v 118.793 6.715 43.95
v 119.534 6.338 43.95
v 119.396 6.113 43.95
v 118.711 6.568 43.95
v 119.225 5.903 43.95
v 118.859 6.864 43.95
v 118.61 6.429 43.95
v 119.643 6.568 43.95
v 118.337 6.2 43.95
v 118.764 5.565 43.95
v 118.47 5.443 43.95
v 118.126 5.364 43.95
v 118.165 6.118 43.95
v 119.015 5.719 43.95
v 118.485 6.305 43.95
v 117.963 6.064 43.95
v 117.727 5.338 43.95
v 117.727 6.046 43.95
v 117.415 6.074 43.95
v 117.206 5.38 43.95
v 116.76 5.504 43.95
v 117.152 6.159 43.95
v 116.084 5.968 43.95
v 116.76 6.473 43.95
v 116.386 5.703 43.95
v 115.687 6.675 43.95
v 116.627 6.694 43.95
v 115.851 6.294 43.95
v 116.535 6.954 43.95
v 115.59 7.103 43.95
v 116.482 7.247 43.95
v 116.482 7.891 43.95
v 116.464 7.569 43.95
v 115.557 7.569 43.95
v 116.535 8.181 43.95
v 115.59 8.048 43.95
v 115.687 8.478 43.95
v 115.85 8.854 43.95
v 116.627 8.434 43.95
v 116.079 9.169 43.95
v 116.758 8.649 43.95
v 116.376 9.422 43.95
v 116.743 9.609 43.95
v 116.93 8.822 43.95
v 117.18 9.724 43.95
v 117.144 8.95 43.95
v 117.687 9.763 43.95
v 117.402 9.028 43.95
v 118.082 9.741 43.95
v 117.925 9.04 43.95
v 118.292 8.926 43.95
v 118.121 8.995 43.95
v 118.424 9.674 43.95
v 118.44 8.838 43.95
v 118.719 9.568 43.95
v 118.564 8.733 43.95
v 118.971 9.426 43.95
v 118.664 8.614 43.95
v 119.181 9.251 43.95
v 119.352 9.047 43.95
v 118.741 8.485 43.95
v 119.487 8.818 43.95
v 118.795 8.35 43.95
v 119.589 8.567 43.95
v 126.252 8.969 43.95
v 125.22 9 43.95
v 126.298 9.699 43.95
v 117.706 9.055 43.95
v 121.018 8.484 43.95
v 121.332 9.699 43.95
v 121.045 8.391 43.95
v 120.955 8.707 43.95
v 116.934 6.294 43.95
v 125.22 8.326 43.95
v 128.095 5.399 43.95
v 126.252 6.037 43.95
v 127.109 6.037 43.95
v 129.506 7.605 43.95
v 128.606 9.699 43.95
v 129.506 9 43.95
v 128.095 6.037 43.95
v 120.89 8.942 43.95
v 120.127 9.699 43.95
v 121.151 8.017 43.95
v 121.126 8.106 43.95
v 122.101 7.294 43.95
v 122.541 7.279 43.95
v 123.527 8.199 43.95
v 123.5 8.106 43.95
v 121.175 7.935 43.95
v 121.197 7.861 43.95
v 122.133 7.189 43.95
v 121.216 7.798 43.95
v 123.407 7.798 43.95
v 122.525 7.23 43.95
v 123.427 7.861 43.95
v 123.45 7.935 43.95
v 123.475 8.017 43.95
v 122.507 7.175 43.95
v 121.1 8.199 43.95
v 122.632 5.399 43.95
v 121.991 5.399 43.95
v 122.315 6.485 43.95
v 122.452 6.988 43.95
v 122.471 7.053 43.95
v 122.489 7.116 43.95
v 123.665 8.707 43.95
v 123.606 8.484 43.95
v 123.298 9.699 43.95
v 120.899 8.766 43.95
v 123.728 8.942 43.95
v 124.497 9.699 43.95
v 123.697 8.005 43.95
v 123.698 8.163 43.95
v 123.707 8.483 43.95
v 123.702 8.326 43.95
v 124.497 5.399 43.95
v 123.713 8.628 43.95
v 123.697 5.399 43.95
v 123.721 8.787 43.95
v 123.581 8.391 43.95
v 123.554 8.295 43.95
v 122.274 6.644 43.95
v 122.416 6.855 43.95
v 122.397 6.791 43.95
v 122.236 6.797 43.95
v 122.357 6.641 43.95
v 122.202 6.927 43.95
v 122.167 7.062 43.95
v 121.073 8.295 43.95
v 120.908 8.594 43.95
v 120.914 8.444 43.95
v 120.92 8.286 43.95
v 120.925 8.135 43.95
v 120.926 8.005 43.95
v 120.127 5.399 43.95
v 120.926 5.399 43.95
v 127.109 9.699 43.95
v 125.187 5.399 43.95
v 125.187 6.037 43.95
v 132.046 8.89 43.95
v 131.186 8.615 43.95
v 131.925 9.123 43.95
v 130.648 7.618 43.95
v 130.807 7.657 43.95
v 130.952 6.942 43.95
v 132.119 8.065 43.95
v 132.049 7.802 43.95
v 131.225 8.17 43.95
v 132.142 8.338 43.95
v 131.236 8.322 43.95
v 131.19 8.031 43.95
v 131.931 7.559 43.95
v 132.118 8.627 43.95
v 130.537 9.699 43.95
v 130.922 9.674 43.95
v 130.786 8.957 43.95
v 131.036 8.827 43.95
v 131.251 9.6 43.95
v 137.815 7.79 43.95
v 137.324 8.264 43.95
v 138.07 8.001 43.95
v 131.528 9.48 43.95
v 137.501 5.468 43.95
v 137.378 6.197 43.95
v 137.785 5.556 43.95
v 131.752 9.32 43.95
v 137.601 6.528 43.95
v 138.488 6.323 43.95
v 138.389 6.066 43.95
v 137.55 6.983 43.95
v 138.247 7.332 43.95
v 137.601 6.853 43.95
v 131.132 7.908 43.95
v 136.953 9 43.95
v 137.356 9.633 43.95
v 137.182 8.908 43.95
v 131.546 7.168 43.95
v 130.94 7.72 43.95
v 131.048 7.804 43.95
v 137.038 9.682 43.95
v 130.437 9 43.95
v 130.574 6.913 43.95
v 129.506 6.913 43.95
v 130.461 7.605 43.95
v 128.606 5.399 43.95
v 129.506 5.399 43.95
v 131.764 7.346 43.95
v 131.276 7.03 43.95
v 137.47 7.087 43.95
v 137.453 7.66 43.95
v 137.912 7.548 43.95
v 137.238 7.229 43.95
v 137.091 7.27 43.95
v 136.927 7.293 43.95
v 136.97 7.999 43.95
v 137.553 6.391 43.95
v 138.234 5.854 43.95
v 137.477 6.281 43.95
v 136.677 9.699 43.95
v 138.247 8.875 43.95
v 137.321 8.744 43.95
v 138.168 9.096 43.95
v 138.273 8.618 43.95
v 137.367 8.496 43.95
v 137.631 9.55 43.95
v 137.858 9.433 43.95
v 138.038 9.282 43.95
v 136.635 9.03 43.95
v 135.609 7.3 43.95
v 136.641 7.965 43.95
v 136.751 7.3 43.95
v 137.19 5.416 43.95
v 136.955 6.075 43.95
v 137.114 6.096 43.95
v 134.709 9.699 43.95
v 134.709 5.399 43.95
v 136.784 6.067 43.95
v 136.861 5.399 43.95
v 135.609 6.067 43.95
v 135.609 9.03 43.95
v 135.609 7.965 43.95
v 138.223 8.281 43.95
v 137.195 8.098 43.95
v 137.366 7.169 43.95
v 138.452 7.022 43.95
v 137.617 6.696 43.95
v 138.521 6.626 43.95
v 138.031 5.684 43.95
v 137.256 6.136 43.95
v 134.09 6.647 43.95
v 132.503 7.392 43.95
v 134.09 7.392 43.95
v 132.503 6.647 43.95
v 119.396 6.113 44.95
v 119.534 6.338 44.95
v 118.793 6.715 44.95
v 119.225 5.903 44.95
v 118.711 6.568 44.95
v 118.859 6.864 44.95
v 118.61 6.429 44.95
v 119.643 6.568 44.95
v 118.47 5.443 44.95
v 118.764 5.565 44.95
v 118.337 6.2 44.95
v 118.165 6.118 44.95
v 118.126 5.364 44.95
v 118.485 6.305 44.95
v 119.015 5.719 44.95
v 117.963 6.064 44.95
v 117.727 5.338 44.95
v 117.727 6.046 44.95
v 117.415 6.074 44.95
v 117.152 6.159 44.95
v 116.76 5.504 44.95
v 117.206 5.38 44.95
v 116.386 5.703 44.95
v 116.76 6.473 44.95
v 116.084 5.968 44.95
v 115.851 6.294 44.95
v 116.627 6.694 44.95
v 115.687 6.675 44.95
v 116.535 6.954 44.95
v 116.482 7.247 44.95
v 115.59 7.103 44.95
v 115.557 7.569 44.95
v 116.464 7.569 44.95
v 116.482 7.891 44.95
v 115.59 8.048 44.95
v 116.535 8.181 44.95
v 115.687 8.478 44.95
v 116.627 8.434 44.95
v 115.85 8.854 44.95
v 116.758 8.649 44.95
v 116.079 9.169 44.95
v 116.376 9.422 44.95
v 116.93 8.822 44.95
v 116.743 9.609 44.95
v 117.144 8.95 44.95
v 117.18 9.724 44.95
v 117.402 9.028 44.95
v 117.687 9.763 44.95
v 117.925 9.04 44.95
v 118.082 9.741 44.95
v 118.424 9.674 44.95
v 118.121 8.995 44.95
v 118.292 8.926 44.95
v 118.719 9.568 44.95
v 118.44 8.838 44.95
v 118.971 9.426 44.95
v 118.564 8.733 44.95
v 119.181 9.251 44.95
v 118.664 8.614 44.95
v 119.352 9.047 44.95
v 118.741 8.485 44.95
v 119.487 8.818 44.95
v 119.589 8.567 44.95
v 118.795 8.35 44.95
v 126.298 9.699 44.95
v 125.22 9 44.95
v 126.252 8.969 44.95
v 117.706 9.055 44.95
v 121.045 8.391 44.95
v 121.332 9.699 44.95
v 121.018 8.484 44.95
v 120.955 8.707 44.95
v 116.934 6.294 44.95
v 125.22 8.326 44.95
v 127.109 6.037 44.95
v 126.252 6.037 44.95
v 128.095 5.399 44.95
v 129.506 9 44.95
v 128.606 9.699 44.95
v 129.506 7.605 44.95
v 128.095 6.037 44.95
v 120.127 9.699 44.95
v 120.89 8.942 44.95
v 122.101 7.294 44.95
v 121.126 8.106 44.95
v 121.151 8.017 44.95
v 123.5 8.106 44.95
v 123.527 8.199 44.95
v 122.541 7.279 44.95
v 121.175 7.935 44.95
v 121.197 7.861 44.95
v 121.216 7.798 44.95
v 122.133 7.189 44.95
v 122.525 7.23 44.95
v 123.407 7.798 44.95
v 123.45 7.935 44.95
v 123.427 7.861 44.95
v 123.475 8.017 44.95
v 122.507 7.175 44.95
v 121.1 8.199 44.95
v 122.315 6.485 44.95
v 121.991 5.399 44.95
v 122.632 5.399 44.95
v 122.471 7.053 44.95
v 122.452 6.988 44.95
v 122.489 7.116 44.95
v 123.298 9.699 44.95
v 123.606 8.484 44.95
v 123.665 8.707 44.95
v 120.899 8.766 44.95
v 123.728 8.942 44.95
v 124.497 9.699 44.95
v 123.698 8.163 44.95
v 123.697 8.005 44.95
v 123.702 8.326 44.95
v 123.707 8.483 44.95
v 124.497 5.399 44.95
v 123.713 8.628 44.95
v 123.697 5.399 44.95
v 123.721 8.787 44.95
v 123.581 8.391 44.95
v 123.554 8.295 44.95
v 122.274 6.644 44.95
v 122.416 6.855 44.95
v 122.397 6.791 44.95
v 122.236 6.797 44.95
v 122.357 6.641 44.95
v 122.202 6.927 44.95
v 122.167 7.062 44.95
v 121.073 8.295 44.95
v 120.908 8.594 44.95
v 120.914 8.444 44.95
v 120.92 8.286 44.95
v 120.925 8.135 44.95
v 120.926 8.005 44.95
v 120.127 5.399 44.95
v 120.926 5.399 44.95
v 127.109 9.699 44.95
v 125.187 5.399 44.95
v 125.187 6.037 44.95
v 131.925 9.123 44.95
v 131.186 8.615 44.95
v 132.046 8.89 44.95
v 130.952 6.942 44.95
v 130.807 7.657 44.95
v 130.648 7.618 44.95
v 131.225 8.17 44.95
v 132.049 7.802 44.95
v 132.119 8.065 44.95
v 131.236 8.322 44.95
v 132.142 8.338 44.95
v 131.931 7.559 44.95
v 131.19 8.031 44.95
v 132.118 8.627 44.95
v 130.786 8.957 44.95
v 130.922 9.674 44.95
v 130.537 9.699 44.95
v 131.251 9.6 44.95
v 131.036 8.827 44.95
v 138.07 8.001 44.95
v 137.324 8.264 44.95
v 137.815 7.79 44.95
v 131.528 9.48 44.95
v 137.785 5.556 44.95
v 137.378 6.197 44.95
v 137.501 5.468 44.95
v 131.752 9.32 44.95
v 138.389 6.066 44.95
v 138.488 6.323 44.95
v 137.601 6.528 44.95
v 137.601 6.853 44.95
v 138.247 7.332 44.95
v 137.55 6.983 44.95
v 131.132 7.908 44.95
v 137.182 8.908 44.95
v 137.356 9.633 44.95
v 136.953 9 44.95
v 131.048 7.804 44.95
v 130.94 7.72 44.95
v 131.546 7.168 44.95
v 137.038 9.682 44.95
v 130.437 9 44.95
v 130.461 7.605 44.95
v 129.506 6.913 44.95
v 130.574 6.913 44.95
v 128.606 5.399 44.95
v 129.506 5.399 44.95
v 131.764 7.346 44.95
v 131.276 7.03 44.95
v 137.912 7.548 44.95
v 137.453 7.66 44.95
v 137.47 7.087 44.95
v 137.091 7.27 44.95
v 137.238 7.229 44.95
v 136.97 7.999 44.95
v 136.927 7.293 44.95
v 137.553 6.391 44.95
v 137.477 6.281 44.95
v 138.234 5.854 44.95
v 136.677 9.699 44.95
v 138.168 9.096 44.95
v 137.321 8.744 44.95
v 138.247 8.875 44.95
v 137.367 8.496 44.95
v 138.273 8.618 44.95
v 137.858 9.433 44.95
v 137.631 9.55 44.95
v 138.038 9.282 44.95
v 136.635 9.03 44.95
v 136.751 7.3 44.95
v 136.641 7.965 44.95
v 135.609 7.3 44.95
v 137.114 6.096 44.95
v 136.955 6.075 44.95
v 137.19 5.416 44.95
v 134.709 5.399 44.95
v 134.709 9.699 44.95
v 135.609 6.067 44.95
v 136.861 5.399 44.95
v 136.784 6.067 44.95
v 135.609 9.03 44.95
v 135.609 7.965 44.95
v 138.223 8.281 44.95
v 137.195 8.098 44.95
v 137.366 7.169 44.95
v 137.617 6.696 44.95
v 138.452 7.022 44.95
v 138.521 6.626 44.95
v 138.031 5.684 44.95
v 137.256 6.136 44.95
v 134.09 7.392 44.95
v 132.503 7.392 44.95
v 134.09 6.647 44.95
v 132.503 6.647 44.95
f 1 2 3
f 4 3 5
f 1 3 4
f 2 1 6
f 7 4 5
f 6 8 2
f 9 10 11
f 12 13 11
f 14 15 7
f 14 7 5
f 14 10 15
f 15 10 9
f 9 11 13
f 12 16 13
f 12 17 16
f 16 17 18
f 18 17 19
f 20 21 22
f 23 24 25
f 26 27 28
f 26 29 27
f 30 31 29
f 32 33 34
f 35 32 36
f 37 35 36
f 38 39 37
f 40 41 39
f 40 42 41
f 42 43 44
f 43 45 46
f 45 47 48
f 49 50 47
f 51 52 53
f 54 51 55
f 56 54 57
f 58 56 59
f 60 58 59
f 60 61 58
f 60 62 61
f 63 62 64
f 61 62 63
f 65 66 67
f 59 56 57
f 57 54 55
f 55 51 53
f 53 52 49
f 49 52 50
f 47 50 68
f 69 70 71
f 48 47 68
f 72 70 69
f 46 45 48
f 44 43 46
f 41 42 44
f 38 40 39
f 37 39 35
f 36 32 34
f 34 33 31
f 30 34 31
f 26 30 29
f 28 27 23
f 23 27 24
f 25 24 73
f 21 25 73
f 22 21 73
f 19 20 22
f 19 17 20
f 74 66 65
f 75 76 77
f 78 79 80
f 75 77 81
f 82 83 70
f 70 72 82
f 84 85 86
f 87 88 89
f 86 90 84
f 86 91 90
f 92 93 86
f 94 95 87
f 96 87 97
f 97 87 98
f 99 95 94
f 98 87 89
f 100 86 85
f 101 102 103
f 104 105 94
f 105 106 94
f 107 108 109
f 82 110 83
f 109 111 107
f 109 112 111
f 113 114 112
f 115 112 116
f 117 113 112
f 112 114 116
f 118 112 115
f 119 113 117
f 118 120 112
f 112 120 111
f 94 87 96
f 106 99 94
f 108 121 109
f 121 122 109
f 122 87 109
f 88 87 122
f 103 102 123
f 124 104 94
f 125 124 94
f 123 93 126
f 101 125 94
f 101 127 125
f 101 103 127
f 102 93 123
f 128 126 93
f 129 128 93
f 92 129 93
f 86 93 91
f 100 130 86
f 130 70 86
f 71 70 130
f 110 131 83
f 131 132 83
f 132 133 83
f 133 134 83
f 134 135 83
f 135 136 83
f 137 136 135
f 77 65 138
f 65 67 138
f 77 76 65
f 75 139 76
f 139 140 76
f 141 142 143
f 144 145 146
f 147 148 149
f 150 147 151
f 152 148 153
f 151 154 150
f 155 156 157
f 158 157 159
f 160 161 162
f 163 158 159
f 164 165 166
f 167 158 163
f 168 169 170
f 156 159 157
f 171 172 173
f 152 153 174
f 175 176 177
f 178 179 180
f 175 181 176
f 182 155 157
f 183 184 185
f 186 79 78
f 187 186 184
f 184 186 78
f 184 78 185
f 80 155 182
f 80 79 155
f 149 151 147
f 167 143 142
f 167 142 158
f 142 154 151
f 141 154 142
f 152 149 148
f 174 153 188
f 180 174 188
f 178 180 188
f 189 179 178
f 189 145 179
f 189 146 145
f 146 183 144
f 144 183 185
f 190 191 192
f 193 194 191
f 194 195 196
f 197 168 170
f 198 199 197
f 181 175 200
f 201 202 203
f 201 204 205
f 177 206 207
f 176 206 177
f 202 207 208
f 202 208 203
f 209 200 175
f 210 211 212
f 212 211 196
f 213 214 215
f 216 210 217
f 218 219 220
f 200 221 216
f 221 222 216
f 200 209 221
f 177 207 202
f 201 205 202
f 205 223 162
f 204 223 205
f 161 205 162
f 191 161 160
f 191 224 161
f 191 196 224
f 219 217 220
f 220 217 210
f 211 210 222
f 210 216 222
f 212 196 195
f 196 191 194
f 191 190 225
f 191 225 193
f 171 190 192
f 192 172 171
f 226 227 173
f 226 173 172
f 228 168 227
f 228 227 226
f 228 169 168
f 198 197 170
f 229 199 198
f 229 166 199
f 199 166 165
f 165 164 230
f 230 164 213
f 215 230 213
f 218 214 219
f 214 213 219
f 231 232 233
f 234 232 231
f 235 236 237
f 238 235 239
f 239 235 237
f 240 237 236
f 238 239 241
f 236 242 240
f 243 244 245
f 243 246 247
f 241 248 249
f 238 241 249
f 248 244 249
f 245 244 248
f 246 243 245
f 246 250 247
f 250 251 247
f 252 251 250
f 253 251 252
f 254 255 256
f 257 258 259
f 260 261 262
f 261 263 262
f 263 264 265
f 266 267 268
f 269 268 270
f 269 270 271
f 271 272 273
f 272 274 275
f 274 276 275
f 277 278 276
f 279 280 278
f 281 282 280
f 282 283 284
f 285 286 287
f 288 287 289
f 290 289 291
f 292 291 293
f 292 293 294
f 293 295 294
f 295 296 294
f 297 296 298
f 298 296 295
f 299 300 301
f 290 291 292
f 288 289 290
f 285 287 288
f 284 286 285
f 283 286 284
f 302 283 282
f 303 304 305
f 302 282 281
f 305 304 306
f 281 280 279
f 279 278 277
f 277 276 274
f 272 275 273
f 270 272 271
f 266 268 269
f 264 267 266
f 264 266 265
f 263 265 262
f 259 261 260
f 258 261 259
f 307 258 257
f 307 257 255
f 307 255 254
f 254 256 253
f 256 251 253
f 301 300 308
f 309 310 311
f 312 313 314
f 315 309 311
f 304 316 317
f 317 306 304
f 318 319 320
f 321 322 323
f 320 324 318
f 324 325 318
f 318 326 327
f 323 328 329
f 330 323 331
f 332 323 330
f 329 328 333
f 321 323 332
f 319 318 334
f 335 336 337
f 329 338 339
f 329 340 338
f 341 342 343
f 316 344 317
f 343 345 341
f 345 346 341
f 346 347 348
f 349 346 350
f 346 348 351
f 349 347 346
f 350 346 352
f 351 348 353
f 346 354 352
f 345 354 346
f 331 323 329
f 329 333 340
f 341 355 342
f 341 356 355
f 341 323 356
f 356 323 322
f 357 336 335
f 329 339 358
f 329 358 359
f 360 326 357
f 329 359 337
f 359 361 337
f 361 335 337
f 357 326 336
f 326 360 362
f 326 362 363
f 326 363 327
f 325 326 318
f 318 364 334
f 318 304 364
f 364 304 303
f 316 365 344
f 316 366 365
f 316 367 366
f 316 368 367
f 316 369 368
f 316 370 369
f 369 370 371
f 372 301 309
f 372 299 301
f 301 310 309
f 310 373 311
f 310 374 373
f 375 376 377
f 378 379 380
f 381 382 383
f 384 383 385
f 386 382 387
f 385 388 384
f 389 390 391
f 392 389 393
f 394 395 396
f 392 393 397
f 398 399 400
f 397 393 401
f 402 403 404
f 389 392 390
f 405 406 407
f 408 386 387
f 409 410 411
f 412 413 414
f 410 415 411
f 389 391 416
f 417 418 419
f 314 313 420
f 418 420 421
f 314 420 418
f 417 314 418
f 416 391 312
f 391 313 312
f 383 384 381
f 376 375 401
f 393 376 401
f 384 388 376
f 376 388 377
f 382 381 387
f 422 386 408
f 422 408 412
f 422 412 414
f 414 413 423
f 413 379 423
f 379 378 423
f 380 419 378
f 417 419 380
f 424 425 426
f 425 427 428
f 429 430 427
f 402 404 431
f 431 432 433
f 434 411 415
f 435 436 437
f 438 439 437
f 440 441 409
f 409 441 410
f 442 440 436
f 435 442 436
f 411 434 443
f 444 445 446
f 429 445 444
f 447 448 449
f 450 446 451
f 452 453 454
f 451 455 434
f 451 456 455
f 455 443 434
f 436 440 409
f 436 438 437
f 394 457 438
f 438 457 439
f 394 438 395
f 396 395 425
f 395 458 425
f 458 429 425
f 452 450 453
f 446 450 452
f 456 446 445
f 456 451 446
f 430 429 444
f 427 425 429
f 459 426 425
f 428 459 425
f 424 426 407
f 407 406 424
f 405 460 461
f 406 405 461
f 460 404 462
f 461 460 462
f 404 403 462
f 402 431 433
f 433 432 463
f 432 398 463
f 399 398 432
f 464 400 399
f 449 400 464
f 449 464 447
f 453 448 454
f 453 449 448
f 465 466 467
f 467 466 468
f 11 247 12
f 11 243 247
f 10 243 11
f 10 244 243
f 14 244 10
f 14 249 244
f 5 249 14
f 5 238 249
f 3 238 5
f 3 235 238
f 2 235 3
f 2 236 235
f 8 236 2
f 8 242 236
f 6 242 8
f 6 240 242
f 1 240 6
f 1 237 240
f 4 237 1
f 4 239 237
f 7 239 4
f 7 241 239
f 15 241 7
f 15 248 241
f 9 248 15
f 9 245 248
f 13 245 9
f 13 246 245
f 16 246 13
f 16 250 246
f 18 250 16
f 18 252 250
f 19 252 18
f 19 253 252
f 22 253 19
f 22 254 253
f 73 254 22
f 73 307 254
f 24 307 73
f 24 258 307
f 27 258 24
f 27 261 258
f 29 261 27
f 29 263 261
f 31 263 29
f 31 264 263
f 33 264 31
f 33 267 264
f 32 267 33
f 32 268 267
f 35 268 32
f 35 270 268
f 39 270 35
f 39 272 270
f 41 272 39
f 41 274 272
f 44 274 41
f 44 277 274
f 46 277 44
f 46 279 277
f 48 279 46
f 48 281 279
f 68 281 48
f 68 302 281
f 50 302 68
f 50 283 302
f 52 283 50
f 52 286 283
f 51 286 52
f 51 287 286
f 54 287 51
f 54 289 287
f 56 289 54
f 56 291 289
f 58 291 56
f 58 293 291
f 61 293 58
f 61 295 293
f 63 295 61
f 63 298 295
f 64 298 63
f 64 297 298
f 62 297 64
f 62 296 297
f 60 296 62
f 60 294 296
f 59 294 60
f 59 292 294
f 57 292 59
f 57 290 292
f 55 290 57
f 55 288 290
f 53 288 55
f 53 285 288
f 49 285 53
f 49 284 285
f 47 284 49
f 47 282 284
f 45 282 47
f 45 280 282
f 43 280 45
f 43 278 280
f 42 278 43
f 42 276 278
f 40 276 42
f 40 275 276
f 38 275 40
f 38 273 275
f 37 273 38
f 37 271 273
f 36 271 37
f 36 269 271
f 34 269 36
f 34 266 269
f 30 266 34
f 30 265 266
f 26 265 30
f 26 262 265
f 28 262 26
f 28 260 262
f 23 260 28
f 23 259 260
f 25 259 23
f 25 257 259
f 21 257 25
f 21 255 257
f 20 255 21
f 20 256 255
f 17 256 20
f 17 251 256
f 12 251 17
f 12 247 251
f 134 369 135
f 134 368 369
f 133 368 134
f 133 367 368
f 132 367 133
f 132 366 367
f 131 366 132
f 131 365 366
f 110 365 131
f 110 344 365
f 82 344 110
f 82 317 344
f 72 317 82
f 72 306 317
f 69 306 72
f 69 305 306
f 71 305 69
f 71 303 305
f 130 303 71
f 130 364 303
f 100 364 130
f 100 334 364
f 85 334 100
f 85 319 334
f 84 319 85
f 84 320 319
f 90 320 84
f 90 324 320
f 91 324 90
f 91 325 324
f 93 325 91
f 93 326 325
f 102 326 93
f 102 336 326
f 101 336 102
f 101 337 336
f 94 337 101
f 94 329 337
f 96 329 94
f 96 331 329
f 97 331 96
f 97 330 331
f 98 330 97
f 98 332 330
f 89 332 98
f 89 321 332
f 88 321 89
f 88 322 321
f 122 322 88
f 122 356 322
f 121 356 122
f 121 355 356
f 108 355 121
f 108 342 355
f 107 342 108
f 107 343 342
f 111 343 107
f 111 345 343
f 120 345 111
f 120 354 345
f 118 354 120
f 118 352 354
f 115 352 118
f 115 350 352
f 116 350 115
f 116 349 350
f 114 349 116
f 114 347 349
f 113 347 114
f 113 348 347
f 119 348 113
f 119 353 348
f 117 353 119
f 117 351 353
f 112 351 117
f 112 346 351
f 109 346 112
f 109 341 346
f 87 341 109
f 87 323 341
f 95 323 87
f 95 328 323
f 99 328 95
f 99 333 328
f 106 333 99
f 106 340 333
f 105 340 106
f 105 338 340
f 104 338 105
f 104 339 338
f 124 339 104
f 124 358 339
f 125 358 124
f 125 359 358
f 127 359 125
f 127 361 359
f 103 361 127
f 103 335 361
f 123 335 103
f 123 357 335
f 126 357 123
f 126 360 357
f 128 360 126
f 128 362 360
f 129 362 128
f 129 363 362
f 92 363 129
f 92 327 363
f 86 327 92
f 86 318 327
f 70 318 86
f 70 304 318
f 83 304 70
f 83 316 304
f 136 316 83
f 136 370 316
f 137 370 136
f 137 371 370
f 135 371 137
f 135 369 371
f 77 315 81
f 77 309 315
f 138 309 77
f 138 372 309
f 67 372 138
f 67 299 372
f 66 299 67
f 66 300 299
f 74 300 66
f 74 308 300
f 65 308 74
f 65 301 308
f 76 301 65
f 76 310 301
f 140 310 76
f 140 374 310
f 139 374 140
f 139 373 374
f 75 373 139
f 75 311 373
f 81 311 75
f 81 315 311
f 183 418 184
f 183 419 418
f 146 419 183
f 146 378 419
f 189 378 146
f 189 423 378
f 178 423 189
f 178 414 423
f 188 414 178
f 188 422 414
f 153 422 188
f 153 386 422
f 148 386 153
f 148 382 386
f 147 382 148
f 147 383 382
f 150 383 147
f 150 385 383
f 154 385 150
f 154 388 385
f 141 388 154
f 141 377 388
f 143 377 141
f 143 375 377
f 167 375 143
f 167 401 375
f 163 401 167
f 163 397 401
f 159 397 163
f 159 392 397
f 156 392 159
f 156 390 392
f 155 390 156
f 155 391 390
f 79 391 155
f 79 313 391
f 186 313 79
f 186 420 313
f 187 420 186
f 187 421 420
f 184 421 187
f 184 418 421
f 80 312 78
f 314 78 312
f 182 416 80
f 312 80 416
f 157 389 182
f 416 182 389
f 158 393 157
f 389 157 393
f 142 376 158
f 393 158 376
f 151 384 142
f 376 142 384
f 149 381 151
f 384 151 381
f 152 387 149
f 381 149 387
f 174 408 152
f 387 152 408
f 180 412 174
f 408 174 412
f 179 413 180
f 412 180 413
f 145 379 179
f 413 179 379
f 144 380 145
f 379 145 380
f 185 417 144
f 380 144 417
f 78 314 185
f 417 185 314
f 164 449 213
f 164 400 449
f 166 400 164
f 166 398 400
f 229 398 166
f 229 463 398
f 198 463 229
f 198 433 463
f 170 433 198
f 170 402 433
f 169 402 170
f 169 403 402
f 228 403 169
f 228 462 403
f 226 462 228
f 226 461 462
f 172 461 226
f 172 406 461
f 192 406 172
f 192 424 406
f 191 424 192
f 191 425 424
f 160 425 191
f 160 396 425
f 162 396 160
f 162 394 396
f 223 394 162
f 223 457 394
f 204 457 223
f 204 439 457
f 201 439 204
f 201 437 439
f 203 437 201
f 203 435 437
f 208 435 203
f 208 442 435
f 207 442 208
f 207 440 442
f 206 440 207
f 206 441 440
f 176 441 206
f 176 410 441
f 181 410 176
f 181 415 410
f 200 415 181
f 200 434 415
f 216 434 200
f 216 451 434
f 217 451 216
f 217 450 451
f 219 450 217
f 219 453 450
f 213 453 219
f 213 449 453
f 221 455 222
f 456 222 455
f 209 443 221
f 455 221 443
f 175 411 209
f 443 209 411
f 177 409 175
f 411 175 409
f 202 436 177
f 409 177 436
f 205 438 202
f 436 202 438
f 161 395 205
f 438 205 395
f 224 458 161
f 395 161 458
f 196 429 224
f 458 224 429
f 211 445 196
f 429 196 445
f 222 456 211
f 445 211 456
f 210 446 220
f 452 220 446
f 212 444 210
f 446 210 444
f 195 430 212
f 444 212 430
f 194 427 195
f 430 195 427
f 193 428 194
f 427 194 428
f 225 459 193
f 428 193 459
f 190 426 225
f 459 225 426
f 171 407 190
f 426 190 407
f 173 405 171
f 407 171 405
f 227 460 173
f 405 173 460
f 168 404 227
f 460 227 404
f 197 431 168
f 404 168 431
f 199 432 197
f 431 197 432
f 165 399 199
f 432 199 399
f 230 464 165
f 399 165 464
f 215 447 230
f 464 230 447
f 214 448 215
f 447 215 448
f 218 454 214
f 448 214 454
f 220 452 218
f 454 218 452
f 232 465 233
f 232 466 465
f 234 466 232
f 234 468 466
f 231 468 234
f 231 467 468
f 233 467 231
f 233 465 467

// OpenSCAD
// CM1P-B ID text, engraved 0.5 into the plate's top face (frame as cm1p_a_freecad.py).
translate([127, 7.5, 43.95]) linear_extrude(1) text("CM1P-B", size = 4.5, font = "Liberation Sans:style=Bold", halign = "center", valign = "center");
